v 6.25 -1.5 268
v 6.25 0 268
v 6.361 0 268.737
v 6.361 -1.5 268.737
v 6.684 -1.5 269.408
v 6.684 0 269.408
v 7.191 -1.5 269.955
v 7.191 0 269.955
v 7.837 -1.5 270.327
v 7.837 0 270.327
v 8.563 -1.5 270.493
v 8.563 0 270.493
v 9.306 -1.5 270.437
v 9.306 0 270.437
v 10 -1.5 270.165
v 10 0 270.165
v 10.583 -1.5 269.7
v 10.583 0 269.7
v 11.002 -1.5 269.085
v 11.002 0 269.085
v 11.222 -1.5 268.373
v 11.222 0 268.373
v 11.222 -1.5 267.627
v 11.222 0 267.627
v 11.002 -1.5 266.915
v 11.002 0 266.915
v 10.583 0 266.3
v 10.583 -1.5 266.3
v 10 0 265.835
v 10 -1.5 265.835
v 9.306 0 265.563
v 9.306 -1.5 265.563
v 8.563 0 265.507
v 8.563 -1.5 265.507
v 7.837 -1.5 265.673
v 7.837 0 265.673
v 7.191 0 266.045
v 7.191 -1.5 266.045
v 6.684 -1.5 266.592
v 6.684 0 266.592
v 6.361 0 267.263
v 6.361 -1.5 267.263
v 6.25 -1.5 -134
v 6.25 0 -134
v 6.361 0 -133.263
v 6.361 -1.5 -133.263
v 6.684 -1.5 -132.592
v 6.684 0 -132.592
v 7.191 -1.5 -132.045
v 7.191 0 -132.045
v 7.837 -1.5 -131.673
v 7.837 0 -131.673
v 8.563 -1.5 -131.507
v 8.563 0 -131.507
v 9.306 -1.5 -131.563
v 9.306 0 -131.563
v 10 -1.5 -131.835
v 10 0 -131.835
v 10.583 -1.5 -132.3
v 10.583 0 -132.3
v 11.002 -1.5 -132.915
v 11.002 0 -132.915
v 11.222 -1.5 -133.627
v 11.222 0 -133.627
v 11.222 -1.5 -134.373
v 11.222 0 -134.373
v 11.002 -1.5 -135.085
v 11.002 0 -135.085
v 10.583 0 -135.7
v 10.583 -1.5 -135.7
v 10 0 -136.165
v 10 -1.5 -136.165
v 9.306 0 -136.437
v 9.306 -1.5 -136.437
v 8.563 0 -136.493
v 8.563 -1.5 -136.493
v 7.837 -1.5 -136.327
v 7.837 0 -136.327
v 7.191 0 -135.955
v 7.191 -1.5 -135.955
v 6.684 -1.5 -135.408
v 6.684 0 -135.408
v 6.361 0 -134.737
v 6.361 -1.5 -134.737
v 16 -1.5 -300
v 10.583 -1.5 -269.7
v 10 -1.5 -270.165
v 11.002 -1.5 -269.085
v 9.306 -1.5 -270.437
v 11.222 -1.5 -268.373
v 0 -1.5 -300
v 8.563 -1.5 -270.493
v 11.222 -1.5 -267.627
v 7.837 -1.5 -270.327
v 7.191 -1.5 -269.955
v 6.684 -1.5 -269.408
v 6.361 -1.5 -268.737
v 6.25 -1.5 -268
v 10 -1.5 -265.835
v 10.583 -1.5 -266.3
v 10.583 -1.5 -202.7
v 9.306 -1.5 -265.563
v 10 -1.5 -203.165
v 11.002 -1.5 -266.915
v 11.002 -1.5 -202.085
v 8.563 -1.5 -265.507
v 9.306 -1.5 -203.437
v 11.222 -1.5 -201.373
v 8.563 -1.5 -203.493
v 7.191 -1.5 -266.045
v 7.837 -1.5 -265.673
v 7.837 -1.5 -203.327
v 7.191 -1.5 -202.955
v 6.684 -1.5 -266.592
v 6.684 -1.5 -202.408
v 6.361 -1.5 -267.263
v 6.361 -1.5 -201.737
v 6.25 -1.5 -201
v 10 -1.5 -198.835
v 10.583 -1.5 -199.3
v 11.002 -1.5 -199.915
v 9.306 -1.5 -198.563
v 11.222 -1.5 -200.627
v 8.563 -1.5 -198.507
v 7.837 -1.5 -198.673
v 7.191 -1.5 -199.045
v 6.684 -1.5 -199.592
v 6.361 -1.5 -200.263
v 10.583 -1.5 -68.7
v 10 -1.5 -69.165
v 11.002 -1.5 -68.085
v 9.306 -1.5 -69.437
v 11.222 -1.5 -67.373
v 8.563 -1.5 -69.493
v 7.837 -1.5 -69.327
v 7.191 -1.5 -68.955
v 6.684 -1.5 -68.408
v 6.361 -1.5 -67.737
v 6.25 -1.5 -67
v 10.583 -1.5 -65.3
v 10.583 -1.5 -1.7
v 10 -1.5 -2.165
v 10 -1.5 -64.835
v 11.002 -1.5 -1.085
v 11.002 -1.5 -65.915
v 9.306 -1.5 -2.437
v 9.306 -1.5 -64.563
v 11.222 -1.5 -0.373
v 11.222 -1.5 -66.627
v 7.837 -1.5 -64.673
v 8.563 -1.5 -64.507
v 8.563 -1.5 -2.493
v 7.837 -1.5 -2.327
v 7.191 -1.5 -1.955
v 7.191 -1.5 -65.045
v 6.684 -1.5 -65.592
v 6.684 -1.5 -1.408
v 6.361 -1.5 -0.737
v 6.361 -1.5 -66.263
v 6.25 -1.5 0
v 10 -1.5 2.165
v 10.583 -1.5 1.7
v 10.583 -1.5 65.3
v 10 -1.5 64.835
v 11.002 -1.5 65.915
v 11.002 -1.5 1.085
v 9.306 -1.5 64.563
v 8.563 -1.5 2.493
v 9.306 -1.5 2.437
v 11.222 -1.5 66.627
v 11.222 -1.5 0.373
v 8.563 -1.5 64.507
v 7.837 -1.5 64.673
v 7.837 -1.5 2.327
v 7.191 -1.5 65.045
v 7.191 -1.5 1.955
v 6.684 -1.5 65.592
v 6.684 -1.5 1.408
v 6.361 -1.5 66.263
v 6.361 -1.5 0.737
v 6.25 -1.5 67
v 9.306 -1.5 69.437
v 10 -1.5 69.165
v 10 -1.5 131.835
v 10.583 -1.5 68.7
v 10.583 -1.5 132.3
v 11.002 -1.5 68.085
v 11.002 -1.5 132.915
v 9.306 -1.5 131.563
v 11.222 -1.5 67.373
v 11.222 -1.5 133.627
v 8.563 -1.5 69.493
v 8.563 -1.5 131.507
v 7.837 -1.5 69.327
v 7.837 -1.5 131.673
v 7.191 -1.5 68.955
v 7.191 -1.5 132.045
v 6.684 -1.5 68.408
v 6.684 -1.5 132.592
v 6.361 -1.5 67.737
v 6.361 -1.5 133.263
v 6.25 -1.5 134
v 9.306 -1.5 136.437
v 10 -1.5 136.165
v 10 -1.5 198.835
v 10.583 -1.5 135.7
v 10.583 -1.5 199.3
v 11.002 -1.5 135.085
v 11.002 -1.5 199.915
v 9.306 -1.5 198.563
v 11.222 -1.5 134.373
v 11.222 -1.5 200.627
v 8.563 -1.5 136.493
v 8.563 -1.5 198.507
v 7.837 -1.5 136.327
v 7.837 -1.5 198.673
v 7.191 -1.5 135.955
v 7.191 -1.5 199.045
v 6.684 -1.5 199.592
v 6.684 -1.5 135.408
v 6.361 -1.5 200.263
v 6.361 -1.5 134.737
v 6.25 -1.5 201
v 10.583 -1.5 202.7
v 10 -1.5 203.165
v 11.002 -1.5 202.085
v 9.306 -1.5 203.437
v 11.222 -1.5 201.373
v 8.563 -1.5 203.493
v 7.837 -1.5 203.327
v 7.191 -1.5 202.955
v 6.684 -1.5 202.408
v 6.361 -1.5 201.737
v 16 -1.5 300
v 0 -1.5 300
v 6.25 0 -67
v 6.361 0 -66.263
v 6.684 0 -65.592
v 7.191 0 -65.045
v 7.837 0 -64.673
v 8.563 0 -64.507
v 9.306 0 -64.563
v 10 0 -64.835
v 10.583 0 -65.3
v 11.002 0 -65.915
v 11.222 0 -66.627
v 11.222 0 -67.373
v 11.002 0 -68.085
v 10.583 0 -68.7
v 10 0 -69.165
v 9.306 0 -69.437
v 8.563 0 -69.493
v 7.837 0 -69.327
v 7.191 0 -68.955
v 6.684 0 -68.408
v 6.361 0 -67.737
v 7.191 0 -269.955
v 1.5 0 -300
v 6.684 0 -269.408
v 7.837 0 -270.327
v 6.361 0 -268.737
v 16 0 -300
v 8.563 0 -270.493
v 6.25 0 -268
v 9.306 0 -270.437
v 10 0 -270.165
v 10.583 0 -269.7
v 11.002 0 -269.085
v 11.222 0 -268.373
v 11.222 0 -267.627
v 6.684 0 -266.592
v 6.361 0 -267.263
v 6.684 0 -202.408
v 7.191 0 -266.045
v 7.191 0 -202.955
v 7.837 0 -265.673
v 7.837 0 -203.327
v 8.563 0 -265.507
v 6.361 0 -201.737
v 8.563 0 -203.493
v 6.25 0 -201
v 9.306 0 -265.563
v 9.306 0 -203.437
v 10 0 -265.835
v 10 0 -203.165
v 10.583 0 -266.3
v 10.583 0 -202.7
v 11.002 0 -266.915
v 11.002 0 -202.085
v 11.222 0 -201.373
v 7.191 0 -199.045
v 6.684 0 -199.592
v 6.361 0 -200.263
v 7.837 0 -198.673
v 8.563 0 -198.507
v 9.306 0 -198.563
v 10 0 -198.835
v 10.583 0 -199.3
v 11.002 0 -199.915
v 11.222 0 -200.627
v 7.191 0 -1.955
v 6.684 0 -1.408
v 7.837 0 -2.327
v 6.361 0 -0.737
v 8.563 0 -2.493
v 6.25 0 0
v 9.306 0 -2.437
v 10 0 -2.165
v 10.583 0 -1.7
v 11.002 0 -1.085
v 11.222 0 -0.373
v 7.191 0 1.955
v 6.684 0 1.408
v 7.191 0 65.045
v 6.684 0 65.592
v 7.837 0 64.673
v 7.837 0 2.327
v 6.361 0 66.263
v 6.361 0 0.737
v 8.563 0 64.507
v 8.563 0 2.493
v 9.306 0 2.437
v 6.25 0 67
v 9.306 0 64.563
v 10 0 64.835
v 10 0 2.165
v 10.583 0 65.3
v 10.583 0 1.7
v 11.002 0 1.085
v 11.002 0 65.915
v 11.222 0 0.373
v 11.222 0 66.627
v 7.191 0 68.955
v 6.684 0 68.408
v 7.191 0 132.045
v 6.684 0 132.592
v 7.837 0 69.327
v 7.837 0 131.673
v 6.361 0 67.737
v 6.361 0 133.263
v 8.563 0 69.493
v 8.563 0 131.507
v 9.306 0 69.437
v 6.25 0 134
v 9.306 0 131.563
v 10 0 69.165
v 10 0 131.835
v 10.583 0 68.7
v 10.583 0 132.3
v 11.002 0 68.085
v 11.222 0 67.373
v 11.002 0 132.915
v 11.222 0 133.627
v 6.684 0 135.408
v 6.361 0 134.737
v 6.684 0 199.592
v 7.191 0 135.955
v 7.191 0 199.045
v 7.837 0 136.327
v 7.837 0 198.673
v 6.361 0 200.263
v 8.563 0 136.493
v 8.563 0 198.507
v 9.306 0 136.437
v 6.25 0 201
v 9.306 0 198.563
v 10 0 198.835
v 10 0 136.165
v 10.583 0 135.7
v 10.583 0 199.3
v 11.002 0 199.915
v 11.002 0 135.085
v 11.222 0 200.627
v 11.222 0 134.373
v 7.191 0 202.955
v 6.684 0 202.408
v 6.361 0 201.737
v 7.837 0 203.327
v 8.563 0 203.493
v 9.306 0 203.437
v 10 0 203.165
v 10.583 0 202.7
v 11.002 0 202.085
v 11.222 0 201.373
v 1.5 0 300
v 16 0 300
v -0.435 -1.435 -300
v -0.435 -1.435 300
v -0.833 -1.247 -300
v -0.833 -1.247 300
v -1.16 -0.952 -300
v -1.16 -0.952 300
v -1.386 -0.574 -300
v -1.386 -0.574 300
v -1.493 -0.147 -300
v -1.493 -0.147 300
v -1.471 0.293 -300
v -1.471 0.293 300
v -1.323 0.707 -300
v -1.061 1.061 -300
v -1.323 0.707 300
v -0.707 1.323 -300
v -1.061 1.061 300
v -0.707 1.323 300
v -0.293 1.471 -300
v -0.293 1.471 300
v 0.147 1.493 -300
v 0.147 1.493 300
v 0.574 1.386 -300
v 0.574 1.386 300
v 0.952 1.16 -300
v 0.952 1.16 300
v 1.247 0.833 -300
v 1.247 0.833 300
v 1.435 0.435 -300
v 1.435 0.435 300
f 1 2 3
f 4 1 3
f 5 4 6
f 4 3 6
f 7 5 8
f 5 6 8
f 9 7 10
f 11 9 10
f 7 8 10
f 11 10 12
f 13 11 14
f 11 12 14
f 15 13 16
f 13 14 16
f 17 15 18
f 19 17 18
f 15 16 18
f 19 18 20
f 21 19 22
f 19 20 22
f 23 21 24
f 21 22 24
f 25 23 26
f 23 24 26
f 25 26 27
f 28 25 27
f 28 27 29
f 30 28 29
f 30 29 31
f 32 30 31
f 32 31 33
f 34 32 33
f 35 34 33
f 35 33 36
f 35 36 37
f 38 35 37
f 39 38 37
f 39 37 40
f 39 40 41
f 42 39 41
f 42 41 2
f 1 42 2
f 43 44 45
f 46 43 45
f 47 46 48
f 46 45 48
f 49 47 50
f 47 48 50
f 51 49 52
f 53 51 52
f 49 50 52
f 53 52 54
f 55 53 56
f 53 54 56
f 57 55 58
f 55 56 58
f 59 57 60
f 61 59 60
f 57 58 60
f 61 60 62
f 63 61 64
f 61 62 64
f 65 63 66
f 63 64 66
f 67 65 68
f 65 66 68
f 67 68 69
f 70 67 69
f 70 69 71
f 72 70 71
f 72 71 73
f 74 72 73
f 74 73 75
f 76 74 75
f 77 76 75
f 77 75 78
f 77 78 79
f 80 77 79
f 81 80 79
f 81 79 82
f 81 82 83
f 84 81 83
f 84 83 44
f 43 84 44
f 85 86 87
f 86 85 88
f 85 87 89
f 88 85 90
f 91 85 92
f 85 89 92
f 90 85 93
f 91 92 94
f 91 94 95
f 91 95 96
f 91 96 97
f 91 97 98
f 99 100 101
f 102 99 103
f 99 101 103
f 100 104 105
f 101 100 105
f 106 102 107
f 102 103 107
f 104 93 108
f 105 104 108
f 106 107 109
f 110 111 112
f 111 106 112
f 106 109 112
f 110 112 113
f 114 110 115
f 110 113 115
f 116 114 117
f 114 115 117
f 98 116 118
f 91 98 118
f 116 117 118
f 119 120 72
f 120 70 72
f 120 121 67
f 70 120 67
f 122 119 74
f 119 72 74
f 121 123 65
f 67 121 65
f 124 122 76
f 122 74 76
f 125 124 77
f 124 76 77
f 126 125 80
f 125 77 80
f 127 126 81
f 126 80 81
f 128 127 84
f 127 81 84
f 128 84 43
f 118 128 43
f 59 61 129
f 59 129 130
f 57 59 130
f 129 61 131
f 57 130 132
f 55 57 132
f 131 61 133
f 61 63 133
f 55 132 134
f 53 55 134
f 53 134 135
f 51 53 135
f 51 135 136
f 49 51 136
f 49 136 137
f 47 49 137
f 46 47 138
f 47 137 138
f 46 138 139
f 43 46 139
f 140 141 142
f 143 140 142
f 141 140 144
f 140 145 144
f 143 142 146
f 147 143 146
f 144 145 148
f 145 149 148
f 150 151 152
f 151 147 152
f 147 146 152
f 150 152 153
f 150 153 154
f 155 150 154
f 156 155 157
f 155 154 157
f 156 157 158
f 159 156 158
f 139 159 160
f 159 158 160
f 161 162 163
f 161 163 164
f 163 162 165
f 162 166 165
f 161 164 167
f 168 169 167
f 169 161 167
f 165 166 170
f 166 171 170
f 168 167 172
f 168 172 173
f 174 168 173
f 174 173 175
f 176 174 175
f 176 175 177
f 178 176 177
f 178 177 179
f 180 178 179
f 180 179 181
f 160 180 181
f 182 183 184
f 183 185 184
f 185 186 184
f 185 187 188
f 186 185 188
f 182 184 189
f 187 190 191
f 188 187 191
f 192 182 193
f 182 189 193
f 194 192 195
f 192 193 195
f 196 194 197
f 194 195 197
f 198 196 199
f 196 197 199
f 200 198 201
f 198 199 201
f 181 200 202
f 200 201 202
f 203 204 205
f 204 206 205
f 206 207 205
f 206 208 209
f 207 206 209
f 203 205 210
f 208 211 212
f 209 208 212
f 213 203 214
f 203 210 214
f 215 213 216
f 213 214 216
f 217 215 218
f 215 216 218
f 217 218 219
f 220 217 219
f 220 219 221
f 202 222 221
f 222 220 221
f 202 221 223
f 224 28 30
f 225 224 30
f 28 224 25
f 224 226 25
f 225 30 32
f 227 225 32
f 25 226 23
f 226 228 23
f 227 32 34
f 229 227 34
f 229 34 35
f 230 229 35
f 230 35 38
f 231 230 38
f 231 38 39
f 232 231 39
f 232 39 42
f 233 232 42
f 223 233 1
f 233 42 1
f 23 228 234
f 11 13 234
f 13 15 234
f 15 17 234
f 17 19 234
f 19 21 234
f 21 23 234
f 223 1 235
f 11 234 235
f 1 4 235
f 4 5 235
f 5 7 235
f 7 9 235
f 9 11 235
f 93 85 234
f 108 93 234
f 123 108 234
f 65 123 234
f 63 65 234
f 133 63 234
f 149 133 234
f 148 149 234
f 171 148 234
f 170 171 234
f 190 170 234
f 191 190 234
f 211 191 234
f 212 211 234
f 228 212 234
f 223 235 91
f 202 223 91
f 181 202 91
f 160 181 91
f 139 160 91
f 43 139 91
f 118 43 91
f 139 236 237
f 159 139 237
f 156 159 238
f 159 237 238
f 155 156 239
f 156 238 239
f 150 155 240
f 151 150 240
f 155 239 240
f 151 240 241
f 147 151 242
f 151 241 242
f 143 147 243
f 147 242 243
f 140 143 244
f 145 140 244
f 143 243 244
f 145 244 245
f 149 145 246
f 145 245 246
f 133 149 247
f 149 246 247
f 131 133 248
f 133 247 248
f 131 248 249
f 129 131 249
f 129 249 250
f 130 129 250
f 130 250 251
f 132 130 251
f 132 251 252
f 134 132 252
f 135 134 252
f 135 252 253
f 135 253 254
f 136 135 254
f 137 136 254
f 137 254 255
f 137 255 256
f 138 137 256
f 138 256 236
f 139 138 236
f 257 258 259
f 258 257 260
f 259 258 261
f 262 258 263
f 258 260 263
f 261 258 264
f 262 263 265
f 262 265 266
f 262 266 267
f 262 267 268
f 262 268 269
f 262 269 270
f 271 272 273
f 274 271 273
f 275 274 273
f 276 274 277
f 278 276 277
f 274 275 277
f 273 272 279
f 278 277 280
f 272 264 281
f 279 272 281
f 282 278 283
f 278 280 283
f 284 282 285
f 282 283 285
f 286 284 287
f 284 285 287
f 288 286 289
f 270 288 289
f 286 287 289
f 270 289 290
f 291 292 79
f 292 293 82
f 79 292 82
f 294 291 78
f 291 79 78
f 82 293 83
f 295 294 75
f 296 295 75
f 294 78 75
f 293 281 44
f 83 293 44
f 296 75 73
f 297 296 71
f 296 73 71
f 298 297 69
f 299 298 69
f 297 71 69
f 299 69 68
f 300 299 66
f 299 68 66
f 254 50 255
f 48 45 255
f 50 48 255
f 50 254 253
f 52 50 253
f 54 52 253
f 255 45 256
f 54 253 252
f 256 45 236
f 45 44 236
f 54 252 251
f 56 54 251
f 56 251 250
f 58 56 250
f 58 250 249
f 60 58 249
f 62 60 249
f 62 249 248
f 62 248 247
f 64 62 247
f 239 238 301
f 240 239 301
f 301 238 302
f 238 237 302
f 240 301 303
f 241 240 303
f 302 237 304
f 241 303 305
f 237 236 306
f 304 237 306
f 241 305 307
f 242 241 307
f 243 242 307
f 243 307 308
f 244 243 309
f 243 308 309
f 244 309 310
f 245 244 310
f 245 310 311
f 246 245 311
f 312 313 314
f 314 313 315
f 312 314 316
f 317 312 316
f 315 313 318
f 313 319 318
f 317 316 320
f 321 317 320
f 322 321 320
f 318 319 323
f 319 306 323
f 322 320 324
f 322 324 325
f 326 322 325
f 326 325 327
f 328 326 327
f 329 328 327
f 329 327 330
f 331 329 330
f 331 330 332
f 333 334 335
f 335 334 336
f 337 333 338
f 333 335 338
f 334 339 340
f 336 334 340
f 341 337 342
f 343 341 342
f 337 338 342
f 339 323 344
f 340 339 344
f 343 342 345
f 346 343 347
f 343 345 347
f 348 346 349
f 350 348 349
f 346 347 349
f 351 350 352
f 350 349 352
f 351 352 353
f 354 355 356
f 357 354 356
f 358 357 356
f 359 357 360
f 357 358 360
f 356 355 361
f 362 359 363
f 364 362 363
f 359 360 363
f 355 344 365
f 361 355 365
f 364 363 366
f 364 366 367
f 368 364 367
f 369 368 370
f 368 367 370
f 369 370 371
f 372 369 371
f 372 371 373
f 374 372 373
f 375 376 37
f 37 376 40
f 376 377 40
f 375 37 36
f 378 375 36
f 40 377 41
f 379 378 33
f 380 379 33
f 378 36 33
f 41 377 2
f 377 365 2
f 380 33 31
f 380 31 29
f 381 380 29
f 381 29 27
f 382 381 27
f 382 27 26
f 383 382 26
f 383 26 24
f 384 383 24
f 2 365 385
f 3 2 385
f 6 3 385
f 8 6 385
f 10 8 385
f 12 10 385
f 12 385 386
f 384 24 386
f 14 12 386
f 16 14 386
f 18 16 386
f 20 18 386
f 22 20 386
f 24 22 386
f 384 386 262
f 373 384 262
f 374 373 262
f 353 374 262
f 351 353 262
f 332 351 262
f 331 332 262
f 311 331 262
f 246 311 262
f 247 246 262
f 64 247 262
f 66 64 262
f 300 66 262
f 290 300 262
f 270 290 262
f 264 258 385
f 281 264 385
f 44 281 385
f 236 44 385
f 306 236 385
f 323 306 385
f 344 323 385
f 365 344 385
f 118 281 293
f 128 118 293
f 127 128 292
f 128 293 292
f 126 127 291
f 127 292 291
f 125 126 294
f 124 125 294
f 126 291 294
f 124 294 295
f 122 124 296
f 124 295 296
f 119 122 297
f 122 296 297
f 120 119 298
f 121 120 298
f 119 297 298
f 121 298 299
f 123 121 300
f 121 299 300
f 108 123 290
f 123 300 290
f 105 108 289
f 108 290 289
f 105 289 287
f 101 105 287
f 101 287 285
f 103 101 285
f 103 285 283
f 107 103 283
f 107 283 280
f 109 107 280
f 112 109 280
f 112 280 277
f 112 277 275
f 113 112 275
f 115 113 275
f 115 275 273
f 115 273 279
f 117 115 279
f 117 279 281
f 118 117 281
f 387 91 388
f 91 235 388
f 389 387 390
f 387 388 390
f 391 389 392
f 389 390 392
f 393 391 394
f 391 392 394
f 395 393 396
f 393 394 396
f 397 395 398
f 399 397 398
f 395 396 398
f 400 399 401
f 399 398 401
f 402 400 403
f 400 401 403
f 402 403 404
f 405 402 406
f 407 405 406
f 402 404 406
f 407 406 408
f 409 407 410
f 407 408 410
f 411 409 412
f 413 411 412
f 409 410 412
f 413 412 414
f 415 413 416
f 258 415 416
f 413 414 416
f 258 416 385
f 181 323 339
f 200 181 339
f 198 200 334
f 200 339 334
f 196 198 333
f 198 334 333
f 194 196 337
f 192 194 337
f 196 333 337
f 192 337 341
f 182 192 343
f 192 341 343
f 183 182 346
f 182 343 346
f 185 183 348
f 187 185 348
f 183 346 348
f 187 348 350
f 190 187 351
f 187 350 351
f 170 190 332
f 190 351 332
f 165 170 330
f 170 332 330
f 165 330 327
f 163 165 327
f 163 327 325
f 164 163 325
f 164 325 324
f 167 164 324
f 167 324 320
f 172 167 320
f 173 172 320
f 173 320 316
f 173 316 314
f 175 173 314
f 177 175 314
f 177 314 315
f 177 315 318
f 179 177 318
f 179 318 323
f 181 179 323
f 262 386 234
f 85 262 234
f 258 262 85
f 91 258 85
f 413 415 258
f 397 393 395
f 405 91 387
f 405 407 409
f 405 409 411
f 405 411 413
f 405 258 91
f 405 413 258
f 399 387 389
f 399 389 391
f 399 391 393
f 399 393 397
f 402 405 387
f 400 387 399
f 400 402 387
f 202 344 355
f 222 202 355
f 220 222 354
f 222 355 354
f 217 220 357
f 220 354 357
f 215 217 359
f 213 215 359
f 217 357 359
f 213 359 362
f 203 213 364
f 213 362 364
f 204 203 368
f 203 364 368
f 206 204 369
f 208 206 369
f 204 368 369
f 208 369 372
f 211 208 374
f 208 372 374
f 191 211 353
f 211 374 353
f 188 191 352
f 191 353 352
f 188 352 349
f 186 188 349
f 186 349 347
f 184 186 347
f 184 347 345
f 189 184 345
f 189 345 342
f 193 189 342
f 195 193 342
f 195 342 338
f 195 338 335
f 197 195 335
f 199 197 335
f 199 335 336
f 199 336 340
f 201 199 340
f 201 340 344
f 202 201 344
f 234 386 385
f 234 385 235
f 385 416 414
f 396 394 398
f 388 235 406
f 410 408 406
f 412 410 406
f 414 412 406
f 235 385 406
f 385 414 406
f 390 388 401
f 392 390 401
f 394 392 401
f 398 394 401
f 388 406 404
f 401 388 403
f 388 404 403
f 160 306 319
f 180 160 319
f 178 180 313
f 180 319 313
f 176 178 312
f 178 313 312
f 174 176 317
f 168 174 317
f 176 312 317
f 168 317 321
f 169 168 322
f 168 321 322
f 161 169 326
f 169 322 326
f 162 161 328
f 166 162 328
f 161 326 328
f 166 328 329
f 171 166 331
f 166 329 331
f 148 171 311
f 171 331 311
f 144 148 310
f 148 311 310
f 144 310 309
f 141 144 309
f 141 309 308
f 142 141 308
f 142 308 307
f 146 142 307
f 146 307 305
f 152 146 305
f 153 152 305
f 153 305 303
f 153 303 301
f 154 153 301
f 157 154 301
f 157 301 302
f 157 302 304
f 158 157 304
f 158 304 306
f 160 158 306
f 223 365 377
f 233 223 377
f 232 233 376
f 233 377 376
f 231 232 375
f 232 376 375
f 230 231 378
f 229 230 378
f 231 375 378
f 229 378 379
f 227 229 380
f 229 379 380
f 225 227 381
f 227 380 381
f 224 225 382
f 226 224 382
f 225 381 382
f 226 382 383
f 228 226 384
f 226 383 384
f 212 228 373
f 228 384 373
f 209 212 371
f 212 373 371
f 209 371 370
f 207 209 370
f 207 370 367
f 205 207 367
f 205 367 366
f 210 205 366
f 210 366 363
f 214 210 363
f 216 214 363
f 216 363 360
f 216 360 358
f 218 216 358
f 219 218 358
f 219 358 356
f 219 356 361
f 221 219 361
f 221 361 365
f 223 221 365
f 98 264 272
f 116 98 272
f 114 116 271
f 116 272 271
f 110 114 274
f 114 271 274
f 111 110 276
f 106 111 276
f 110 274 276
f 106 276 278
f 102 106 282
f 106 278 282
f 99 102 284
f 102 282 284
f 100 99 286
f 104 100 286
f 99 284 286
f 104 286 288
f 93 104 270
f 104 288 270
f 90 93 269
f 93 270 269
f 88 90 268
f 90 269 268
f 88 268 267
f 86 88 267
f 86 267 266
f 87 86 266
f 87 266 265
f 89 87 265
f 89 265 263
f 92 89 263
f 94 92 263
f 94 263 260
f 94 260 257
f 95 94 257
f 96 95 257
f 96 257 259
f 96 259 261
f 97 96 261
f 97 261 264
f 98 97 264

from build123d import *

# Parameters (mm, degrees)
BOSS_EXTRU_1_DEPTH         = 300
ESQUISSE2_R                = 2.5
ENL_V_MAT_EXTRU_1_DEPTH    = 301.430108345
R_P_TITION_LIN_AIRE1_COUNT = 9
R_P_TITION_LIN_AIRE1_PITCH = 67


with BuildPart() as part:
    # Esquisse1 → Boss.-Extru.1 (new, symmetric)
    with BuildSketch(Plane.XY):
        with BuildLine():
            Line((16, -1.5), (0, -1.5))
            ThreePointArc((0, -1.5), (-1.060660172, 1.060660172), (1.5, 0))
            Line((1.5, 0), (16, 0))
            Line((16, 0), (16, -1.5))
        make_face()
    extrude(amount=BOSS_EXTRU_1_DEPTH, both=True)

    # Esquisse2 → Enlèv. mat.-Extru.1 (cut, through all)
    with BuildSketch(Plane(origin=(0, 0, 0), x_dir=(1, 0, 0), z_dir=(0, 1, 0))):
        with Locations(Location((8.75, -268, 0), (0, 0, 180))):
            Circle(ESQUISSE2_R)
    enl_v_mat_extru_1 = extrude(amount=-ENL_V_MAT_EXTRU_1_DEPTH, mode=Mode.SUBTRACT)

    # Répétition linéaire1: Enlèv. mat.-Extru.1 ×9
    with Locations(*[(0, 0, -i * R_P_TITION_LIN_AIRE1_PITCH) for i in range(1, R_P_TITION_LIN_AIRE1_COUNT)]):
        add(enl_v_mat_extru_1, mode=Mode.SUBTRACT)


solid = part.part
